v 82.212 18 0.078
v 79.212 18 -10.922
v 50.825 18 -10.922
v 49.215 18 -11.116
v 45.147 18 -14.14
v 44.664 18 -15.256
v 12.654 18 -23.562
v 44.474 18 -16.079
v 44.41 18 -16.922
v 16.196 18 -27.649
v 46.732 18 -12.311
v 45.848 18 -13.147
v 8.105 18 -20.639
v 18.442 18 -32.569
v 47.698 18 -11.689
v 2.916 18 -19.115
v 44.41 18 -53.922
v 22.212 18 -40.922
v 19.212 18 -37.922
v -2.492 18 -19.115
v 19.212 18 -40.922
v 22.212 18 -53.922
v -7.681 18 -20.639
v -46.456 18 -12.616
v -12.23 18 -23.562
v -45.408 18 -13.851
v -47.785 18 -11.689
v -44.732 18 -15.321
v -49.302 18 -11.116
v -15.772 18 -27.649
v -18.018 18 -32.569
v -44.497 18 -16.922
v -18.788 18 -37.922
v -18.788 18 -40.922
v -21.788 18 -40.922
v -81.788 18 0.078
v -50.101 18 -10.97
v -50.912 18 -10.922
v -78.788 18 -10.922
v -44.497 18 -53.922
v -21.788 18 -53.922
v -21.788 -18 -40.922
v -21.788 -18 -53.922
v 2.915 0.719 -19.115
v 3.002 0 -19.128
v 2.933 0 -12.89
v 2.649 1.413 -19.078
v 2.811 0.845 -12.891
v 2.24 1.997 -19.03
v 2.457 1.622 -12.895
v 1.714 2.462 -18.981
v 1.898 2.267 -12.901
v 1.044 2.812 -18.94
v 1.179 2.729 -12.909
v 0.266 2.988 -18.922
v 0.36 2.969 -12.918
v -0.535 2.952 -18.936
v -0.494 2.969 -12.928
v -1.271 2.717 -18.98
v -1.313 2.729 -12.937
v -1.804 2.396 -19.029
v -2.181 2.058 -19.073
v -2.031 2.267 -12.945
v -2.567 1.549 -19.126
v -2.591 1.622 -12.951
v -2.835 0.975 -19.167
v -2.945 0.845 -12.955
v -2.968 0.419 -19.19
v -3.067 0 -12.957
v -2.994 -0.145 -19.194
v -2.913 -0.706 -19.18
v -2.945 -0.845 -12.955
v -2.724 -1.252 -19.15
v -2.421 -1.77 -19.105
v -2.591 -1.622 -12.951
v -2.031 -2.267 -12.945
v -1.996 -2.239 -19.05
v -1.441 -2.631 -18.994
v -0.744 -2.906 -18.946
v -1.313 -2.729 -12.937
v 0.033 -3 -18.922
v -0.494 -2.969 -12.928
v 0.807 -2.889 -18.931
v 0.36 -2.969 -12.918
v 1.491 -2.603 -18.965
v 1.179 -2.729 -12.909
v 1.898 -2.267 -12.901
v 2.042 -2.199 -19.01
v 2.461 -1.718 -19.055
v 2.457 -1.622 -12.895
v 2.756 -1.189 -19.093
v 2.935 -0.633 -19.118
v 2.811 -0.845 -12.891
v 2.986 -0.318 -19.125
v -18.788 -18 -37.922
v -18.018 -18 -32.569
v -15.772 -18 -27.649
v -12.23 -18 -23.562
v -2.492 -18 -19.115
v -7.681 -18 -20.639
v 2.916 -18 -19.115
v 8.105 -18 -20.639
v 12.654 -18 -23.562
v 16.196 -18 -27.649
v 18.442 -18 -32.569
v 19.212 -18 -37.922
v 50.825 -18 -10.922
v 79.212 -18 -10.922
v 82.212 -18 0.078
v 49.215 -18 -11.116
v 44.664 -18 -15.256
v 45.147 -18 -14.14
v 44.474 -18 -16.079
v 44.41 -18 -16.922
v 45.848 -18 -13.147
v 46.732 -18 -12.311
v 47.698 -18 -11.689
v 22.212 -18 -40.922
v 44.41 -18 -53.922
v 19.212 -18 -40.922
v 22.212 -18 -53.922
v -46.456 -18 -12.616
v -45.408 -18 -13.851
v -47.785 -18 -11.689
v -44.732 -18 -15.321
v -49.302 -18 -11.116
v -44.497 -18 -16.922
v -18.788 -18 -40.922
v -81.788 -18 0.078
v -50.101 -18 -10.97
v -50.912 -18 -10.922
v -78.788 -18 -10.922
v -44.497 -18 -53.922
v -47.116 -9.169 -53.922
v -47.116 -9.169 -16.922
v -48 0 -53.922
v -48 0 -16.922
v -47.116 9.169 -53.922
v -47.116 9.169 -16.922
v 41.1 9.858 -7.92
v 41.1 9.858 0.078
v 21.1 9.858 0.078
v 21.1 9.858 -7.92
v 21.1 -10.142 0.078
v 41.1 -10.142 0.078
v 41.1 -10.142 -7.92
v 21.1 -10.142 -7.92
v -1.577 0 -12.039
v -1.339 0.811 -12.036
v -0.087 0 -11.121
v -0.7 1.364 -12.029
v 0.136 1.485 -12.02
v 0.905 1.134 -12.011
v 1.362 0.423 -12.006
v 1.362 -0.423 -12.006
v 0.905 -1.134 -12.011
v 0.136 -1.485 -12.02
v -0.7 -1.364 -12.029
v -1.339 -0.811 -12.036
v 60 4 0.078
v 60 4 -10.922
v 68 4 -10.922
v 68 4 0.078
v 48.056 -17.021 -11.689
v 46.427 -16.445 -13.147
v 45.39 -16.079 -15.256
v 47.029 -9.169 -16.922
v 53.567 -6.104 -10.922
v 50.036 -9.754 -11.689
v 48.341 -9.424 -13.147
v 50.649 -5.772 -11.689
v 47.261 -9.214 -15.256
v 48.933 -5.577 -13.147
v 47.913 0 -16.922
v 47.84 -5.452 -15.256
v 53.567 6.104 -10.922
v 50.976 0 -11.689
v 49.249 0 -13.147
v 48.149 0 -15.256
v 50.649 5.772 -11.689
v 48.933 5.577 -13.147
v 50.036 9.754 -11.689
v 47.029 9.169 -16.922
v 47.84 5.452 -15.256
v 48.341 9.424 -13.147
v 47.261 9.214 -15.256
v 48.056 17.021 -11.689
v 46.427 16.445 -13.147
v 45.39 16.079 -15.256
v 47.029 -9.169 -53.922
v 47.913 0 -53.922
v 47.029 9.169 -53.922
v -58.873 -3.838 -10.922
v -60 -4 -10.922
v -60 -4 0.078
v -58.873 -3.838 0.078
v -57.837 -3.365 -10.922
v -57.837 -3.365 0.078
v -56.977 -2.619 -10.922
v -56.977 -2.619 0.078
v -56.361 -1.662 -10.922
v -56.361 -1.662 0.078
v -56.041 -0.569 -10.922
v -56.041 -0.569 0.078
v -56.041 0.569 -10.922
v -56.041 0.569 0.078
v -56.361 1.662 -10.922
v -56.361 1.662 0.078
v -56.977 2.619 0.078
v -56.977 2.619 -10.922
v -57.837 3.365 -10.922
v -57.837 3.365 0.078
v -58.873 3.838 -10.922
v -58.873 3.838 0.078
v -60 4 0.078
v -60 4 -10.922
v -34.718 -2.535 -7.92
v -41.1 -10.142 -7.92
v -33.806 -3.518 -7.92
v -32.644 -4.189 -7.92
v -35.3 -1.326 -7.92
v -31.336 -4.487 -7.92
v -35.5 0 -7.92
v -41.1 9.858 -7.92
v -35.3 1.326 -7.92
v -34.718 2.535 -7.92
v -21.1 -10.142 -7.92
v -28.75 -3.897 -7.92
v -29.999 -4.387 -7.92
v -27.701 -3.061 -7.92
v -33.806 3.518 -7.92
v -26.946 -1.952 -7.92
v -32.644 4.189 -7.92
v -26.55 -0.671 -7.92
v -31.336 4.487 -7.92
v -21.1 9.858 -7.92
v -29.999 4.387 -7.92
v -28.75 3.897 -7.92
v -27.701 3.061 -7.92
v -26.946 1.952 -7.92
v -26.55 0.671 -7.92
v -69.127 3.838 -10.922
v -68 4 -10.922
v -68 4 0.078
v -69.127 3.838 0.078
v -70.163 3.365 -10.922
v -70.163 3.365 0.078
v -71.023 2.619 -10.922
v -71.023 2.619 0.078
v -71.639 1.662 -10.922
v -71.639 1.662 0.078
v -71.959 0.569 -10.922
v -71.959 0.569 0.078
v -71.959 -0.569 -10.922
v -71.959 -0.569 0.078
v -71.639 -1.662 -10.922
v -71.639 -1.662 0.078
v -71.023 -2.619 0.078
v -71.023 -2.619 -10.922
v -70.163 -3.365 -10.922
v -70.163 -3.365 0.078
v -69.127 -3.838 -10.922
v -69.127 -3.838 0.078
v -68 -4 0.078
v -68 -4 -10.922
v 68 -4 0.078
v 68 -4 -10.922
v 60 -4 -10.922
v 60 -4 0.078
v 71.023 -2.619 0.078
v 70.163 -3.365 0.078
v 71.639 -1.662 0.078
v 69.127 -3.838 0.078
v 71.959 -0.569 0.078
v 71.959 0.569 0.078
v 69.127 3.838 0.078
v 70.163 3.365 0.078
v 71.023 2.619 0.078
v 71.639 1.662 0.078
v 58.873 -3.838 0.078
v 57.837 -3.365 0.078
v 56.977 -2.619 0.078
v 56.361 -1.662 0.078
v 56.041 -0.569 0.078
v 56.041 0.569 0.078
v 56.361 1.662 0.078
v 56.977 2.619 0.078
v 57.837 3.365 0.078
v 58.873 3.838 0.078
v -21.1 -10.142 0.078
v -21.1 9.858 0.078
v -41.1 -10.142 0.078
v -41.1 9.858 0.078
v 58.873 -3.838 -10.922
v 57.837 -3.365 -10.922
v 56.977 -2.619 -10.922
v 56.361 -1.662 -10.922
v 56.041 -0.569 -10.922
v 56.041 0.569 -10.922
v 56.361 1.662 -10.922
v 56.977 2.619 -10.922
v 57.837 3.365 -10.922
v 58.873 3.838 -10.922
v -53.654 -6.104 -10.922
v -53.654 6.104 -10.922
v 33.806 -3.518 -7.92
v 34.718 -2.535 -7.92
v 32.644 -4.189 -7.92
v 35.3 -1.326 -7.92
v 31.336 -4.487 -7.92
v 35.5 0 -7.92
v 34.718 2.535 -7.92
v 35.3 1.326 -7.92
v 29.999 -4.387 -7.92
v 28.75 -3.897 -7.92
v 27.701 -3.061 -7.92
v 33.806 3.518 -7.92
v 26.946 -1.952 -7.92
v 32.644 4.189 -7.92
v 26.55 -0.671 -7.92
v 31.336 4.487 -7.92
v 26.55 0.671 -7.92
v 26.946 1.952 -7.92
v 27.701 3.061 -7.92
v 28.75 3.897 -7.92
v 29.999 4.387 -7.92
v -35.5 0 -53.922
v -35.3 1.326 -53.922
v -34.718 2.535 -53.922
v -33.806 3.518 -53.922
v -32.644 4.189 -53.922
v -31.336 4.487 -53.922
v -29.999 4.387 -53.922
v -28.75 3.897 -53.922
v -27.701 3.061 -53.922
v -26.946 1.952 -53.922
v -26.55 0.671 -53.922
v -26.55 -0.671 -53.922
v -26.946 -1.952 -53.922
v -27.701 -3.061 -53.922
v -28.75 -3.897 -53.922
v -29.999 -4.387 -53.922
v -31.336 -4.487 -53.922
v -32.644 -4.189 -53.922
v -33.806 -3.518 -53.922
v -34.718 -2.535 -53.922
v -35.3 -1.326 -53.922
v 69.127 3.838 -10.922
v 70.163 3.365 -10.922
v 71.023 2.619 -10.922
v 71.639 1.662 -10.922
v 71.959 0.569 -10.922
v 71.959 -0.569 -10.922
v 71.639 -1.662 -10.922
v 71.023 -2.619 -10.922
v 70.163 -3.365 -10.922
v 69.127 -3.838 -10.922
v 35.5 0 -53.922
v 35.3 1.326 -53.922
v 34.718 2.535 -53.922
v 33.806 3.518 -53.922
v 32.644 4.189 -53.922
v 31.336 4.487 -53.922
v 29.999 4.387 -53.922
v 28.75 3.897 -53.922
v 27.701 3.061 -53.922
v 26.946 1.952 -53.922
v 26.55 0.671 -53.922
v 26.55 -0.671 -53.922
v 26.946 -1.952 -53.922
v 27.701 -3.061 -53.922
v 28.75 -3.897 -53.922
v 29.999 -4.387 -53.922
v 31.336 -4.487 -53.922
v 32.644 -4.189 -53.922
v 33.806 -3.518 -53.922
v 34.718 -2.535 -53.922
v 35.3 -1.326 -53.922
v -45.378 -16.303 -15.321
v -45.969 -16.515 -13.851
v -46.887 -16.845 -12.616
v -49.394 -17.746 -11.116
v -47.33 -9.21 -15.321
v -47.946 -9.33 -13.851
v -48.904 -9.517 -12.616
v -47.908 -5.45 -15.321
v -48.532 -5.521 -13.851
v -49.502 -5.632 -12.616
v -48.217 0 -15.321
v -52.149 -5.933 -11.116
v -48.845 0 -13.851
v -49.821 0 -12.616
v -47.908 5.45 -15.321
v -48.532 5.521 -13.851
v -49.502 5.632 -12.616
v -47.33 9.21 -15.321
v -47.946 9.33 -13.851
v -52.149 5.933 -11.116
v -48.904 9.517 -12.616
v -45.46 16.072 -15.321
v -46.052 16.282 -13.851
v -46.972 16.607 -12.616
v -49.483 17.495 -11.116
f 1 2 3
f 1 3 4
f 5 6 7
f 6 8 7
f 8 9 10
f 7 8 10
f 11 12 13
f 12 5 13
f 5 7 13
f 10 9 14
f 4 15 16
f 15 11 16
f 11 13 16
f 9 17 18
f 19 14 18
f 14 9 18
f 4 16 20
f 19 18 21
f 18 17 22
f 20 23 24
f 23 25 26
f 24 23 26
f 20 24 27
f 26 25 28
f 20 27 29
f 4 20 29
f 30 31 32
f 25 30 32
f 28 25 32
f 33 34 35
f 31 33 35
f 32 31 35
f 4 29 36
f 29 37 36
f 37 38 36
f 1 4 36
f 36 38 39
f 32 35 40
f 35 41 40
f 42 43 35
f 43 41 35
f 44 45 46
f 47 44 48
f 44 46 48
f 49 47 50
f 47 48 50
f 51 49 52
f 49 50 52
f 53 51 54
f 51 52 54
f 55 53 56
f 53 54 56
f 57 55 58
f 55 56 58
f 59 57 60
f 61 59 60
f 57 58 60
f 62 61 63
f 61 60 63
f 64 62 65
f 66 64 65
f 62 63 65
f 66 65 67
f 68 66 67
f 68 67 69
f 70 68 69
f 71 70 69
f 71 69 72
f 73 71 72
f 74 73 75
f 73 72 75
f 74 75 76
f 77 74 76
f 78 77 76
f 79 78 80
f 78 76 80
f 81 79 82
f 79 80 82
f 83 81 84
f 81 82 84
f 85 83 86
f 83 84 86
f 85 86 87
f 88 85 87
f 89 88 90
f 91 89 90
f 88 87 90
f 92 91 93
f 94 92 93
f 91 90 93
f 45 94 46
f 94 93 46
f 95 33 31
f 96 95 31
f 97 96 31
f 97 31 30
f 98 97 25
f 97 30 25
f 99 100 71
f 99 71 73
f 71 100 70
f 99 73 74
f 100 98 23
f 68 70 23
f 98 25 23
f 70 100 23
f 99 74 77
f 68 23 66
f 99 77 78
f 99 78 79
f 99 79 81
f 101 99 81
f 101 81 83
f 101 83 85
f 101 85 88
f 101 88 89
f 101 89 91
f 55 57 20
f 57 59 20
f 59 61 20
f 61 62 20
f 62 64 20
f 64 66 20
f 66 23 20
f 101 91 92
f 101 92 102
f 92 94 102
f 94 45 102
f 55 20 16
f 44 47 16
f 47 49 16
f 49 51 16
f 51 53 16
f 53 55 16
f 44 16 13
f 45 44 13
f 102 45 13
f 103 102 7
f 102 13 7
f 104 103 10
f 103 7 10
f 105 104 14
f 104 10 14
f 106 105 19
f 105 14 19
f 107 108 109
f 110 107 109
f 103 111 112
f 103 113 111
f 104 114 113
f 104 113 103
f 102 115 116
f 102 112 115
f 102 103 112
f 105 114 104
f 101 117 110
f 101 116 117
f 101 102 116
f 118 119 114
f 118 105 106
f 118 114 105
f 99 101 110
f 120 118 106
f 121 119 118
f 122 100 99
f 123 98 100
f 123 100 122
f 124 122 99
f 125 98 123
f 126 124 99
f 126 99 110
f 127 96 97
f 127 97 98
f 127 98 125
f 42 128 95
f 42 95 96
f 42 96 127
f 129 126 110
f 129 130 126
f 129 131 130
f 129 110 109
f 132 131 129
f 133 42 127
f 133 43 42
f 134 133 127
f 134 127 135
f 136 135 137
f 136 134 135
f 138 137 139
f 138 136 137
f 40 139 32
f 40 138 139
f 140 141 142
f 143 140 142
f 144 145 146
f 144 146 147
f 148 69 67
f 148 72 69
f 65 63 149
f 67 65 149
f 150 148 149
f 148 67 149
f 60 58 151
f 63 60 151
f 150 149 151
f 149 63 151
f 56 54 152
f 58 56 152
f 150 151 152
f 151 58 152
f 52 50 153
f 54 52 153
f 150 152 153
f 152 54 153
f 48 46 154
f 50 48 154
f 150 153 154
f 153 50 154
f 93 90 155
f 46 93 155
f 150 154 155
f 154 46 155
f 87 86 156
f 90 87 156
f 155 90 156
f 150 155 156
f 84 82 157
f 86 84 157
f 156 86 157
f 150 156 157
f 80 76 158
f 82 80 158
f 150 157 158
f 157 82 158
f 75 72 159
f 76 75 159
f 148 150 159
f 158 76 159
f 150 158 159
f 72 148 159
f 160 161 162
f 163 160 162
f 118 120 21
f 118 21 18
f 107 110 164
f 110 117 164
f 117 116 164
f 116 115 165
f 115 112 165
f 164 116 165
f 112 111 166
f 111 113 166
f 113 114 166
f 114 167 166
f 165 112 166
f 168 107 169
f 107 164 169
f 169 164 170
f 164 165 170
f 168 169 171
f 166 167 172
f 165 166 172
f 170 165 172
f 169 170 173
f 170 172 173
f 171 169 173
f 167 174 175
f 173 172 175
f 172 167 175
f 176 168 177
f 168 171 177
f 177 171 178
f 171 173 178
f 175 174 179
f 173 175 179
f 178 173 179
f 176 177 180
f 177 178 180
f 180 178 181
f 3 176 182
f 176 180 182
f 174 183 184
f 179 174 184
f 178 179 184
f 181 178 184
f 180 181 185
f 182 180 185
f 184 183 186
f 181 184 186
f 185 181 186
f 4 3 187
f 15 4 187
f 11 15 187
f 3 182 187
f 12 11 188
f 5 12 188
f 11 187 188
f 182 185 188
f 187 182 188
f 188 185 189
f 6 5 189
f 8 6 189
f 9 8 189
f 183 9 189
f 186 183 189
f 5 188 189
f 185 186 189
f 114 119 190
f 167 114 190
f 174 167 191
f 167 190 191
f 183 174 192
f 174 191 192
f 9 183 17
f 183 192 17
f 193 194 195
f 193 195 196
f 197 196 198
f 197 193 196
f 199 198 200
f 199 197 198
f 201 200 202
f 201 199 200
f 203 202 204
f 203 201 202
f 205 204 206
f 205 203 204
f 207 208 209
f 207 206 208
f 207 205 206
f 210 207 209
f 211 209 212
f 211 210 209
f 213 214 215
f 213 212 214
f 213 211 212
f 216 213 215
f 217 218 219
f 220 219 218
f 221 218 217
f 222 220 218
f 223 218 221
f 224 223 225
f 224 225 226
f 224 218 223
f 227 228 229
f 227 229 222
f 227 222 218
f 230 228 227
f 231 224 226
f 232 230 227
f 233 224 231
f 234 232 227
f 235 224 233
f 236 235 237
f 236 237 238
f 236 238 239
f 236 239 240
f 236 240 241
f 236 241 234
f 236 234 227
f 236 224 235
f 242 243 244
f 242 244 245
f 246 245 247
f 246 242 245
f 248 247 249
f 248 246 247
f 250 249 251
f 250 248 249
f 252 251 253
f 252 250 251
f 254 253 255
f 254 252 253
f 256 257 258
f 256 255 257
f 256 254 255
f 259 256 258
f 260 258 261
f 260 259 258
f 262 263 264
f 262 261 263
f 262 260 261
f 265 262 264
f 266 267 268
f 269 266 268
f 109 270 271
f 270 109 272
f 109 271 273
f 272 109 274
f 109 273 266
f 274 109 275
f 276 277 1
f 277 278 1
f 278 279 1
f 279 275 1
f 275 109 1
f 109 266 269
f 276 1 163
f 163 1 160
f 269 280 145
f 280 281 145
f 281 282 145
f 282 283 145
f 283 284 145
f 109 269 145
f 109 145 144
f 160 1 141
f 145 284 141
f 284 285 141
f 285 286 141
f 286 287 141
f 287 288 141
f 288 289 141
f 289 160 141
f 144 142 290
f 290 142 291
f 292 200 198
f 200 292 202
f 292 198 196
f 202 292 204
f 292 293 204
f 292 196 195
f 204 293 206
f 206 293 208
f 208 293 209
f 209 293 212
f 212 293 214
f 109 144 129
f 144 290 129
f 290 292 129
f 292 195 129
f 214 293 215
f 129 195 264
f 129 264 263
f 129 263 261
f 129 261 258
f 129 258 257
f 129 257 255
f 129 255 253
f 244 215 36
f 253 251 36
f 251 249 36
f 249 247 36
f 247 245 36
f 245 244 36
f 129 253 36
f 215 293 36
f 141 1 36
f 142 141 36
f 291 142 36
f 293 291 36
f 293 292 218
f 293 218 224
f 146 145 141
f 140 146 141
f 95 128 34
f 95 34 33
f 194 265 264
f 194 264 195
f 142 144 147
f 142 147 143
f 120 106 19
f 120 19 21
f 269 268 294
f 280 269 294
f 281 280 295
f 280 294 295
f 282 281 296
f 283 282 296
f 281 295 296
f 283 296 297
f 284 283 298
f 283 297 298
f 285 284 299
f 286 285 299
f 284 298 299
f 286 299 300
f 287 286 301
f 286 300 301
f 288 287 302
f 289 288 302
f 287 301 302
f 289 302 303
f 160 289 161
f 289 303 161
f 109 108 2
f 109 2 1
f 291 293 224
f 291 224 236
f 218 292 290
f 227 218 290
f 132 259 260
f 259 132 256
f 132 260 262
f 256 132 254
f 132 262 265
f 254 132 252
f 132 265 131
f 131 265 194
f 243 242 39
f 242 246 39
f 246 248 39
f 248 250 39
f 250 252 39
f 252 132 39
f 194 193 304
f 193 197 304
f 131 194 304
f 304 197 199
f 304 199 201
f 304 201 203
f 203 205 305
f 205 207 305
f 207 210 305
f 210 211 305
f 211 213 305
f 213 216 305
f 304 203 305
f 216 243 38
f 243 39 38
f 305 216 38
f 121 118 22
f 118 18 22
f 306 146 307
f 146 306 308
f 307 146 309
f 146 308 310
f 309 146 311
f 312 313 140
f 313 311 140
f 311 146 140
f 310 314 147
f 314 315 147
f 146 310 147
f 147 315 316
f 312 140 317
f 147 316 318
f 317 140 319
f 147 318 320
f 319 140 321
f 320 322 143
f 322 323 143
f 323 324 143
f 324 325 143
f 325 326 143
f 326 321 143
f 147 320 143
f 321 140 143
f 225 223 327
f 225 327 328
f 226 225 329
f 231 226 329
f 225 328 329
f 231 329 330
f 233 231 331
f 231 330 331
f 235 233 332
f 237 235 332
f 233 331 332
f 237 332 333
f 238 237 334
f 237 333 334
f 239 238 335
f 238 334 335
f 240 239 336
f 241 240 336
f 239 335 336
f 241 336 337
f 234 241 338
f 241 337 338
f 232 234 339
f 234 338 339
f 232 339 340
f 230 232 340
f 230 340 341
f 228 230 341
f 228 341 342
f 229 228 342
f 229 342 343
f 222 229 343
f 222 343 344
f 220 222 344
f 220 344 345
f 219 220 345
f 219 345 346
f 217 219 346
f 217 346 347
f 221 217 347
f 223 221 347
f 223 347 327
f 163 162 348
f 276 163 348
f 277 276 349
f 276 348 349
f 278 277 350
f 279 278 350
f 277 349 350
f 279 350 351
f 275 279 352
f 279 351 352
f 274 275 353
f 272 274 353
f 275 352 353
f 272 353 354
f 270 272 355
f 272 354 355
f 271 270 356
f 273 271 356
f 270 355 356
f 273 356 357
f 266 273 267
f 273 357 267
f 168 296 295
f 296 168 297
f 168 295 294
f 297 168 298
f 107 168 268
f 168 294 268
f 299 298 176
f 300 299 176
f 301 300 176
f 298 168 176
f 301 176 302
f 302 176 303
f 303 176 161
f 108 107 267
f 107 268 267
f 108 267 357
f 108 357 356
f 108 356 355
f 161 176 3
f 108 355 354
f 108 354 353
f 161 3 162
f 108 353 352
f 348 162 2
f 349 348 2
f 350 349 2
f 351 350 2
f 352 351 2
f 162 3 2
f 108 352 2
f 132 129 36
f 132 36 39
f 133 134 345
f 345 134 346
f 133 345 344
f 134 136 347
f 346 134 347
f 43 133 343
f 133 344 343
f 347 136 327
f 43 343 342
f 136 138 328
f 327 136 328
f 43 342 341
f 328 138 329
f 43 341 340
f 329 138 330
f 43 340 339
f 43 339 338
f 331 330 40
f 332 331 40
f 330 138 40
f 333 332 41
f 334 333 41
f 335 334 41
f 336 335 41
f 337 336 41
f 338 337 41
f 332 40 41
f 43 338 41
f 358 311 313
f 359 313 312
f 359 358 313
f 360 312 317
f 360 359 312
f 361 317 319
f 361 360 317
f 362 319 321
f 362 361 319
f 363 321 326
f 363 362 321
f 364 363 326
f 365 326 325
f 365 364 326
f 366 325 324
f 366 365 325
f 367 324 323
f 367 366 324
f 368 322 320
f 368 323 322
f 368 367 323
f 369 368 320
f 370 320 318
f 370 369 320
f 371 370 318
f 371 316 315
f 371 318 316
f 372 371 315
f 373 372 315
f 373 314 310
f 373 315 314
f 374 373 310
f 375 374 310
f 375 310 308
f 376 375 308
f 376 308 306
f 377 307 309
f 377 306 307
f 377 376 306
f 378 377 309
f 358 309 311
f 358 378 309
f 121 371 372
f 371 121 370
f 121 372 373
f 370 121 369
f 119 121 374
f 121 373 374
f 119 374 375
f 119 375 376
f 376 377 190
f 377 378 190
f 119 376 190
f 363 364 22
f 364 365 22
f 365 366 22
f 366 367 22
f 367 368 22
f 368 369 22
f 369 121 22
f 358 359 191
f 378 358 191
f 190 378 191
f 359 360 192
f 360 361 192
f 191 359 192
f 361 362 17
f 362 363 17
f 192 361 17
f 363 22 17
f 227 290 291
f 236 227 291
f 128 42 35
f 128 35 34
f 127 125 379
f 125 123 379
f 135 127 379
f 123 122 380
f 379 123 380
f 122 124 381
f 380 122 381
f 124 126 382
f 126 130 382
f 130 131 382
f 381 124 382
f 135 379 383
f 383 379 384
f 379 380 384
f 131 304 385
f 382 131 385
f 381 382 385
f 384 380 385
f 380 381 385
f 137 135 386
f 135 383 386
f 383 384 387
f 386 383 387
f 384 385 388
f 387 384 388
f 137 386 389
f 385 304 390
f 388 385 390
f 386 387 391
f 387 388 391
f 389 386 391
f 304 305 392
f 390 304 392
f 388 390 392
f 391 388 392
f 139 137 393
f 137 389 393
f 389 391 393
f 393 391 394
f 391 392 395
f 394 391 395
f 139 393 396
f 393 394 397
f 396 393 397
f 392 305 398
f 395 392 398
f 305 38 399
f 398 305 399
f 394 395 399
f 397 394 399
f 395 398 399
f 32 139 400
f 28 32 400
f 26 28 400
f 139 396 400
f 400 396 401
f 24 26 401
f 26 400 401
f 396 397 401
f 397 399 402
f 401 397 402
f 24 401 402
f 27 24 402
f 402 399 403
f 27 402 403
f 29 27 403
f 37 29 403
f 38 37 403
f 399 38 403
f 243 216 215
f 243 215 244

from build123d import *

# Parameters (mm, degrees)
BOSS_EXTRUDE1_DEPTH       = 18
CUT_EXTRUDE2_DEPTH        = 43
FILLET2_R                 = 6
SKETCH4_R                 = 4.5
CUT_EXTRUDE3_DEPTH        = 55.0000001
SKETCH5_W                 = 20
SKETCH5_H                 = 20
CUT_EXTRUDE6_DEPTH        = 7.92
CUT_EXTRUDE7_DEPTH        = 12.0000001
F_6_0MM_DOWEL_HOLE1_D     = 6
F_6_0MM_DOWEL_HOLE1_DEPTH = 6
F_6_0MM_DOWEL_HOLE1_TIP   = 1.802581857
CUT_EXTRUDE8_DEPTH        = 43
FILLET3_R                 = 6


with BuildPart() as part:
    # Sketch1 → Boss-Extrude1 (new body, symmetric)
    with BuildSketch(Plane(origin=(0, 0, 0), x_dir=(1, 0, 0), z_dir=(0, 1, 0))):
        with BuildLine():
            Line((19.211898334, 37.921604348), (19.211898334, 40.921604348))
            Line((19.211898334, 40.921604348), (22.211898334, 40.921604348))
            Line((22.211898334, 40.921604348), (22.211898334, 53.921604348))
            Line((22.211898334, 53.921604348), (50.211898334, 53.921604348))
            Line((50.211898334, 53.921604348), (50.211898334, 10.921604348))
            Line((50.211898334, 10.921604348), (79.211898334, 10.921604348))
            Line((79.211898334, 10.921604348), (82.211898334, -0.078395652))
            Line((82.211898334, -0.078395652), (-81.788101666, -0.078395652))
            Line((-81.788101666, -0.078395652), (-78.788101666, 10.921604348))
            Line((-78.788101666, 10.921604348), (-49.788101666, 10.921604348))
            Line((-49.788101666, 10.921604348), (-49.788101666, 53.921604348))
            Line((-49.788101666, 53.921604348), (-21.788101666, 53.921604348))
            Line((-21.788101666, 53.921604348), (-21.788101666, 40.921604348))
            Line((-21.788101666, 40.921604348), (-18.788101666, 40.921604348))
            Line((-18.788101666, 40.921604348), (-18.788101666, 37.921604348))
            ThreePointArc((-18.788101666, 37.921604348), (0.211898334, 18.921604348), (19.211898334, 37.921604348))
        make_face()
    extrude(amount=BOSS_EXTRUDE1_DEPTH, both=True)

    # Sketch3 → Cut-Extrude2 (cut)
    with BuildSketch(Plane(origin=(0, 0, -53.921604348), x_dir=(-1, 0, 0), z_dir=(0, 0, -1))):
        with BuildLine():
            Line((44.497190923, 18), (49.788101666, 18))
            Line((49.788101666, 18), (49.788101666, -18))
            Line((49.788101666, -18), (44.497190923, -18))
            ThreePointArc((44.497190923, -18), (48, 0), (44.497190923, 18))
        make_face()
    extrude(amount=-CUT_EXTRUDE2_DEPTH, mode=Mode.SUBTRACT)

    # Fillet2
    fillet2_edges = [part.edges().sort_by_distance(p)[0] for p in [
        (-48, 0, -10.921604348),
    ]]
    fillet(fillet2_edges, radius=FILLET2_R)

    # Sketch4 → Cut-Extrude3 (cut, through all)
    with BuildSketch(Plane(origin=(0, 0, -53.921604348), x_dir=(-1, 0, 0), z_dir=(0, 0, -1))):
        with Locations((31, 0)):
            Circle(SKETCH4_R)
    cut_extrude3 = extrude(amount=-CUT_EXTRUDE3_DEPTH, mode=Mode.SUBTRACT)

    # Sketch5 → Cut-Extrude6 (cut, symmetric)
    with BuildSketch(Plane.XY):
        with Locations((-31.09995798, -0.141547283)):
            Rectangle(SKETCH5_W, SKETCH5_H)
    cut_extrude6 = extrude(amount=CUT_EXTRUDE6_DEPTH, both=True, mode=Mode.SUBTRACT)

    # Sketch6 → Cut-Extrude7 (cut, through all)
    with BuildSketch(Plane(origin=(0, 0, -10.921604348), x_dir=(-1, 0, 0), z_dir=(0, 0, -1))):
        with BuildLine():
            Line((60, 4), (68, 4))
            ThreePointArc((68, 4), (72, 0), (68, -4))
            Line((68, -4), (60, -4))
            ThreePointArc((60, -4), (56, 0), (60, 4))
        make_face()
    cut_extrude7 = extrude(amount=-CUT_EXTRUDE7_DEPTH, mode=Mode.SUBTRACT)

    # Ø6.0mm Dowel Hole1
    with Locations(Plane(origin=(0, 0, -18.922785988), x_dir=(-0.999937808, 0, -0.011152544), z_dir=(0.011152544, 0, -0.999937808))):
        with Locations((0, 0)):
            Hole(F_6_0MM_DOWEL_HOLE1_D / 2, depth=F_6_0MM_DOWEL_HOLE1_DEPTH)
            with Locations((0, 0, -(F_6_0MM_DOWEL_HOLE1_DEPTH + F_6_0MM_DOWEL_HOLE1_TIP / 2))):  # 118° drill point
                Cone(0, F_6_0MM_DOWEL_HOLE1_D / 2, F_6_0MM_DOWEL_HOLE1_TIP, mode=Mode.SUBTRACT)

    # Mirror3: Cut-Extrude3, Cut-Extrude6, Cut-Extrude7 across plane
    add(cut_extrude3.mirror(Plane(origin=(0, 0, 0), x_dir=(0, 0, 1), z_dir=(1, 0, 0))), mode=Mode.SUBTRACT)
    add(cut_extrude6.mirror(Plane(origin=(0, 0, 0), x_dir=(0, 0, 1), z_dir=(1, 0, 0))), mode=Mode.SUBTRACT)
    add(cut_extrude7.mirror(Plane(origin=(0, 0, 0), x_dir=(0, 0, 1), z_dir=(1, 0, 0))), mode=Mode.SUBTRACT)

    # Sketch10 → Cut-Extrude8 (cut)
    with BuildSketch(Plane(origin=(0, 0, -53.921604348), x_dir=(-1, 0, 0), z_dir=(0, 0, -1))):
        with BuildLine():
            Line((-50.211898334, -18), (-44.410172286, -18))
            ThreePointArc((-44.410172286, -18), (-47.912981363, 0), (-44.410172286, 18))
            Line((-44.410172286, 18), (-50.211898334, 18))
            Line((-50.211898334, 18), (-50.211898334, -18))
        make_face()
    extrude(amount=-CUT_EXTRUDE8_DEPTH, mode=Mode.SUBTRACT)

    # Fillet3
    fillet3_edges = [part.edges().sort_by_distance(p)[0] for p in [
        (47.912981363, 0, -10.921604348),
    ]]
    fillet(fillet3_edges, radius=FILLET3_R)


solid = part.part
